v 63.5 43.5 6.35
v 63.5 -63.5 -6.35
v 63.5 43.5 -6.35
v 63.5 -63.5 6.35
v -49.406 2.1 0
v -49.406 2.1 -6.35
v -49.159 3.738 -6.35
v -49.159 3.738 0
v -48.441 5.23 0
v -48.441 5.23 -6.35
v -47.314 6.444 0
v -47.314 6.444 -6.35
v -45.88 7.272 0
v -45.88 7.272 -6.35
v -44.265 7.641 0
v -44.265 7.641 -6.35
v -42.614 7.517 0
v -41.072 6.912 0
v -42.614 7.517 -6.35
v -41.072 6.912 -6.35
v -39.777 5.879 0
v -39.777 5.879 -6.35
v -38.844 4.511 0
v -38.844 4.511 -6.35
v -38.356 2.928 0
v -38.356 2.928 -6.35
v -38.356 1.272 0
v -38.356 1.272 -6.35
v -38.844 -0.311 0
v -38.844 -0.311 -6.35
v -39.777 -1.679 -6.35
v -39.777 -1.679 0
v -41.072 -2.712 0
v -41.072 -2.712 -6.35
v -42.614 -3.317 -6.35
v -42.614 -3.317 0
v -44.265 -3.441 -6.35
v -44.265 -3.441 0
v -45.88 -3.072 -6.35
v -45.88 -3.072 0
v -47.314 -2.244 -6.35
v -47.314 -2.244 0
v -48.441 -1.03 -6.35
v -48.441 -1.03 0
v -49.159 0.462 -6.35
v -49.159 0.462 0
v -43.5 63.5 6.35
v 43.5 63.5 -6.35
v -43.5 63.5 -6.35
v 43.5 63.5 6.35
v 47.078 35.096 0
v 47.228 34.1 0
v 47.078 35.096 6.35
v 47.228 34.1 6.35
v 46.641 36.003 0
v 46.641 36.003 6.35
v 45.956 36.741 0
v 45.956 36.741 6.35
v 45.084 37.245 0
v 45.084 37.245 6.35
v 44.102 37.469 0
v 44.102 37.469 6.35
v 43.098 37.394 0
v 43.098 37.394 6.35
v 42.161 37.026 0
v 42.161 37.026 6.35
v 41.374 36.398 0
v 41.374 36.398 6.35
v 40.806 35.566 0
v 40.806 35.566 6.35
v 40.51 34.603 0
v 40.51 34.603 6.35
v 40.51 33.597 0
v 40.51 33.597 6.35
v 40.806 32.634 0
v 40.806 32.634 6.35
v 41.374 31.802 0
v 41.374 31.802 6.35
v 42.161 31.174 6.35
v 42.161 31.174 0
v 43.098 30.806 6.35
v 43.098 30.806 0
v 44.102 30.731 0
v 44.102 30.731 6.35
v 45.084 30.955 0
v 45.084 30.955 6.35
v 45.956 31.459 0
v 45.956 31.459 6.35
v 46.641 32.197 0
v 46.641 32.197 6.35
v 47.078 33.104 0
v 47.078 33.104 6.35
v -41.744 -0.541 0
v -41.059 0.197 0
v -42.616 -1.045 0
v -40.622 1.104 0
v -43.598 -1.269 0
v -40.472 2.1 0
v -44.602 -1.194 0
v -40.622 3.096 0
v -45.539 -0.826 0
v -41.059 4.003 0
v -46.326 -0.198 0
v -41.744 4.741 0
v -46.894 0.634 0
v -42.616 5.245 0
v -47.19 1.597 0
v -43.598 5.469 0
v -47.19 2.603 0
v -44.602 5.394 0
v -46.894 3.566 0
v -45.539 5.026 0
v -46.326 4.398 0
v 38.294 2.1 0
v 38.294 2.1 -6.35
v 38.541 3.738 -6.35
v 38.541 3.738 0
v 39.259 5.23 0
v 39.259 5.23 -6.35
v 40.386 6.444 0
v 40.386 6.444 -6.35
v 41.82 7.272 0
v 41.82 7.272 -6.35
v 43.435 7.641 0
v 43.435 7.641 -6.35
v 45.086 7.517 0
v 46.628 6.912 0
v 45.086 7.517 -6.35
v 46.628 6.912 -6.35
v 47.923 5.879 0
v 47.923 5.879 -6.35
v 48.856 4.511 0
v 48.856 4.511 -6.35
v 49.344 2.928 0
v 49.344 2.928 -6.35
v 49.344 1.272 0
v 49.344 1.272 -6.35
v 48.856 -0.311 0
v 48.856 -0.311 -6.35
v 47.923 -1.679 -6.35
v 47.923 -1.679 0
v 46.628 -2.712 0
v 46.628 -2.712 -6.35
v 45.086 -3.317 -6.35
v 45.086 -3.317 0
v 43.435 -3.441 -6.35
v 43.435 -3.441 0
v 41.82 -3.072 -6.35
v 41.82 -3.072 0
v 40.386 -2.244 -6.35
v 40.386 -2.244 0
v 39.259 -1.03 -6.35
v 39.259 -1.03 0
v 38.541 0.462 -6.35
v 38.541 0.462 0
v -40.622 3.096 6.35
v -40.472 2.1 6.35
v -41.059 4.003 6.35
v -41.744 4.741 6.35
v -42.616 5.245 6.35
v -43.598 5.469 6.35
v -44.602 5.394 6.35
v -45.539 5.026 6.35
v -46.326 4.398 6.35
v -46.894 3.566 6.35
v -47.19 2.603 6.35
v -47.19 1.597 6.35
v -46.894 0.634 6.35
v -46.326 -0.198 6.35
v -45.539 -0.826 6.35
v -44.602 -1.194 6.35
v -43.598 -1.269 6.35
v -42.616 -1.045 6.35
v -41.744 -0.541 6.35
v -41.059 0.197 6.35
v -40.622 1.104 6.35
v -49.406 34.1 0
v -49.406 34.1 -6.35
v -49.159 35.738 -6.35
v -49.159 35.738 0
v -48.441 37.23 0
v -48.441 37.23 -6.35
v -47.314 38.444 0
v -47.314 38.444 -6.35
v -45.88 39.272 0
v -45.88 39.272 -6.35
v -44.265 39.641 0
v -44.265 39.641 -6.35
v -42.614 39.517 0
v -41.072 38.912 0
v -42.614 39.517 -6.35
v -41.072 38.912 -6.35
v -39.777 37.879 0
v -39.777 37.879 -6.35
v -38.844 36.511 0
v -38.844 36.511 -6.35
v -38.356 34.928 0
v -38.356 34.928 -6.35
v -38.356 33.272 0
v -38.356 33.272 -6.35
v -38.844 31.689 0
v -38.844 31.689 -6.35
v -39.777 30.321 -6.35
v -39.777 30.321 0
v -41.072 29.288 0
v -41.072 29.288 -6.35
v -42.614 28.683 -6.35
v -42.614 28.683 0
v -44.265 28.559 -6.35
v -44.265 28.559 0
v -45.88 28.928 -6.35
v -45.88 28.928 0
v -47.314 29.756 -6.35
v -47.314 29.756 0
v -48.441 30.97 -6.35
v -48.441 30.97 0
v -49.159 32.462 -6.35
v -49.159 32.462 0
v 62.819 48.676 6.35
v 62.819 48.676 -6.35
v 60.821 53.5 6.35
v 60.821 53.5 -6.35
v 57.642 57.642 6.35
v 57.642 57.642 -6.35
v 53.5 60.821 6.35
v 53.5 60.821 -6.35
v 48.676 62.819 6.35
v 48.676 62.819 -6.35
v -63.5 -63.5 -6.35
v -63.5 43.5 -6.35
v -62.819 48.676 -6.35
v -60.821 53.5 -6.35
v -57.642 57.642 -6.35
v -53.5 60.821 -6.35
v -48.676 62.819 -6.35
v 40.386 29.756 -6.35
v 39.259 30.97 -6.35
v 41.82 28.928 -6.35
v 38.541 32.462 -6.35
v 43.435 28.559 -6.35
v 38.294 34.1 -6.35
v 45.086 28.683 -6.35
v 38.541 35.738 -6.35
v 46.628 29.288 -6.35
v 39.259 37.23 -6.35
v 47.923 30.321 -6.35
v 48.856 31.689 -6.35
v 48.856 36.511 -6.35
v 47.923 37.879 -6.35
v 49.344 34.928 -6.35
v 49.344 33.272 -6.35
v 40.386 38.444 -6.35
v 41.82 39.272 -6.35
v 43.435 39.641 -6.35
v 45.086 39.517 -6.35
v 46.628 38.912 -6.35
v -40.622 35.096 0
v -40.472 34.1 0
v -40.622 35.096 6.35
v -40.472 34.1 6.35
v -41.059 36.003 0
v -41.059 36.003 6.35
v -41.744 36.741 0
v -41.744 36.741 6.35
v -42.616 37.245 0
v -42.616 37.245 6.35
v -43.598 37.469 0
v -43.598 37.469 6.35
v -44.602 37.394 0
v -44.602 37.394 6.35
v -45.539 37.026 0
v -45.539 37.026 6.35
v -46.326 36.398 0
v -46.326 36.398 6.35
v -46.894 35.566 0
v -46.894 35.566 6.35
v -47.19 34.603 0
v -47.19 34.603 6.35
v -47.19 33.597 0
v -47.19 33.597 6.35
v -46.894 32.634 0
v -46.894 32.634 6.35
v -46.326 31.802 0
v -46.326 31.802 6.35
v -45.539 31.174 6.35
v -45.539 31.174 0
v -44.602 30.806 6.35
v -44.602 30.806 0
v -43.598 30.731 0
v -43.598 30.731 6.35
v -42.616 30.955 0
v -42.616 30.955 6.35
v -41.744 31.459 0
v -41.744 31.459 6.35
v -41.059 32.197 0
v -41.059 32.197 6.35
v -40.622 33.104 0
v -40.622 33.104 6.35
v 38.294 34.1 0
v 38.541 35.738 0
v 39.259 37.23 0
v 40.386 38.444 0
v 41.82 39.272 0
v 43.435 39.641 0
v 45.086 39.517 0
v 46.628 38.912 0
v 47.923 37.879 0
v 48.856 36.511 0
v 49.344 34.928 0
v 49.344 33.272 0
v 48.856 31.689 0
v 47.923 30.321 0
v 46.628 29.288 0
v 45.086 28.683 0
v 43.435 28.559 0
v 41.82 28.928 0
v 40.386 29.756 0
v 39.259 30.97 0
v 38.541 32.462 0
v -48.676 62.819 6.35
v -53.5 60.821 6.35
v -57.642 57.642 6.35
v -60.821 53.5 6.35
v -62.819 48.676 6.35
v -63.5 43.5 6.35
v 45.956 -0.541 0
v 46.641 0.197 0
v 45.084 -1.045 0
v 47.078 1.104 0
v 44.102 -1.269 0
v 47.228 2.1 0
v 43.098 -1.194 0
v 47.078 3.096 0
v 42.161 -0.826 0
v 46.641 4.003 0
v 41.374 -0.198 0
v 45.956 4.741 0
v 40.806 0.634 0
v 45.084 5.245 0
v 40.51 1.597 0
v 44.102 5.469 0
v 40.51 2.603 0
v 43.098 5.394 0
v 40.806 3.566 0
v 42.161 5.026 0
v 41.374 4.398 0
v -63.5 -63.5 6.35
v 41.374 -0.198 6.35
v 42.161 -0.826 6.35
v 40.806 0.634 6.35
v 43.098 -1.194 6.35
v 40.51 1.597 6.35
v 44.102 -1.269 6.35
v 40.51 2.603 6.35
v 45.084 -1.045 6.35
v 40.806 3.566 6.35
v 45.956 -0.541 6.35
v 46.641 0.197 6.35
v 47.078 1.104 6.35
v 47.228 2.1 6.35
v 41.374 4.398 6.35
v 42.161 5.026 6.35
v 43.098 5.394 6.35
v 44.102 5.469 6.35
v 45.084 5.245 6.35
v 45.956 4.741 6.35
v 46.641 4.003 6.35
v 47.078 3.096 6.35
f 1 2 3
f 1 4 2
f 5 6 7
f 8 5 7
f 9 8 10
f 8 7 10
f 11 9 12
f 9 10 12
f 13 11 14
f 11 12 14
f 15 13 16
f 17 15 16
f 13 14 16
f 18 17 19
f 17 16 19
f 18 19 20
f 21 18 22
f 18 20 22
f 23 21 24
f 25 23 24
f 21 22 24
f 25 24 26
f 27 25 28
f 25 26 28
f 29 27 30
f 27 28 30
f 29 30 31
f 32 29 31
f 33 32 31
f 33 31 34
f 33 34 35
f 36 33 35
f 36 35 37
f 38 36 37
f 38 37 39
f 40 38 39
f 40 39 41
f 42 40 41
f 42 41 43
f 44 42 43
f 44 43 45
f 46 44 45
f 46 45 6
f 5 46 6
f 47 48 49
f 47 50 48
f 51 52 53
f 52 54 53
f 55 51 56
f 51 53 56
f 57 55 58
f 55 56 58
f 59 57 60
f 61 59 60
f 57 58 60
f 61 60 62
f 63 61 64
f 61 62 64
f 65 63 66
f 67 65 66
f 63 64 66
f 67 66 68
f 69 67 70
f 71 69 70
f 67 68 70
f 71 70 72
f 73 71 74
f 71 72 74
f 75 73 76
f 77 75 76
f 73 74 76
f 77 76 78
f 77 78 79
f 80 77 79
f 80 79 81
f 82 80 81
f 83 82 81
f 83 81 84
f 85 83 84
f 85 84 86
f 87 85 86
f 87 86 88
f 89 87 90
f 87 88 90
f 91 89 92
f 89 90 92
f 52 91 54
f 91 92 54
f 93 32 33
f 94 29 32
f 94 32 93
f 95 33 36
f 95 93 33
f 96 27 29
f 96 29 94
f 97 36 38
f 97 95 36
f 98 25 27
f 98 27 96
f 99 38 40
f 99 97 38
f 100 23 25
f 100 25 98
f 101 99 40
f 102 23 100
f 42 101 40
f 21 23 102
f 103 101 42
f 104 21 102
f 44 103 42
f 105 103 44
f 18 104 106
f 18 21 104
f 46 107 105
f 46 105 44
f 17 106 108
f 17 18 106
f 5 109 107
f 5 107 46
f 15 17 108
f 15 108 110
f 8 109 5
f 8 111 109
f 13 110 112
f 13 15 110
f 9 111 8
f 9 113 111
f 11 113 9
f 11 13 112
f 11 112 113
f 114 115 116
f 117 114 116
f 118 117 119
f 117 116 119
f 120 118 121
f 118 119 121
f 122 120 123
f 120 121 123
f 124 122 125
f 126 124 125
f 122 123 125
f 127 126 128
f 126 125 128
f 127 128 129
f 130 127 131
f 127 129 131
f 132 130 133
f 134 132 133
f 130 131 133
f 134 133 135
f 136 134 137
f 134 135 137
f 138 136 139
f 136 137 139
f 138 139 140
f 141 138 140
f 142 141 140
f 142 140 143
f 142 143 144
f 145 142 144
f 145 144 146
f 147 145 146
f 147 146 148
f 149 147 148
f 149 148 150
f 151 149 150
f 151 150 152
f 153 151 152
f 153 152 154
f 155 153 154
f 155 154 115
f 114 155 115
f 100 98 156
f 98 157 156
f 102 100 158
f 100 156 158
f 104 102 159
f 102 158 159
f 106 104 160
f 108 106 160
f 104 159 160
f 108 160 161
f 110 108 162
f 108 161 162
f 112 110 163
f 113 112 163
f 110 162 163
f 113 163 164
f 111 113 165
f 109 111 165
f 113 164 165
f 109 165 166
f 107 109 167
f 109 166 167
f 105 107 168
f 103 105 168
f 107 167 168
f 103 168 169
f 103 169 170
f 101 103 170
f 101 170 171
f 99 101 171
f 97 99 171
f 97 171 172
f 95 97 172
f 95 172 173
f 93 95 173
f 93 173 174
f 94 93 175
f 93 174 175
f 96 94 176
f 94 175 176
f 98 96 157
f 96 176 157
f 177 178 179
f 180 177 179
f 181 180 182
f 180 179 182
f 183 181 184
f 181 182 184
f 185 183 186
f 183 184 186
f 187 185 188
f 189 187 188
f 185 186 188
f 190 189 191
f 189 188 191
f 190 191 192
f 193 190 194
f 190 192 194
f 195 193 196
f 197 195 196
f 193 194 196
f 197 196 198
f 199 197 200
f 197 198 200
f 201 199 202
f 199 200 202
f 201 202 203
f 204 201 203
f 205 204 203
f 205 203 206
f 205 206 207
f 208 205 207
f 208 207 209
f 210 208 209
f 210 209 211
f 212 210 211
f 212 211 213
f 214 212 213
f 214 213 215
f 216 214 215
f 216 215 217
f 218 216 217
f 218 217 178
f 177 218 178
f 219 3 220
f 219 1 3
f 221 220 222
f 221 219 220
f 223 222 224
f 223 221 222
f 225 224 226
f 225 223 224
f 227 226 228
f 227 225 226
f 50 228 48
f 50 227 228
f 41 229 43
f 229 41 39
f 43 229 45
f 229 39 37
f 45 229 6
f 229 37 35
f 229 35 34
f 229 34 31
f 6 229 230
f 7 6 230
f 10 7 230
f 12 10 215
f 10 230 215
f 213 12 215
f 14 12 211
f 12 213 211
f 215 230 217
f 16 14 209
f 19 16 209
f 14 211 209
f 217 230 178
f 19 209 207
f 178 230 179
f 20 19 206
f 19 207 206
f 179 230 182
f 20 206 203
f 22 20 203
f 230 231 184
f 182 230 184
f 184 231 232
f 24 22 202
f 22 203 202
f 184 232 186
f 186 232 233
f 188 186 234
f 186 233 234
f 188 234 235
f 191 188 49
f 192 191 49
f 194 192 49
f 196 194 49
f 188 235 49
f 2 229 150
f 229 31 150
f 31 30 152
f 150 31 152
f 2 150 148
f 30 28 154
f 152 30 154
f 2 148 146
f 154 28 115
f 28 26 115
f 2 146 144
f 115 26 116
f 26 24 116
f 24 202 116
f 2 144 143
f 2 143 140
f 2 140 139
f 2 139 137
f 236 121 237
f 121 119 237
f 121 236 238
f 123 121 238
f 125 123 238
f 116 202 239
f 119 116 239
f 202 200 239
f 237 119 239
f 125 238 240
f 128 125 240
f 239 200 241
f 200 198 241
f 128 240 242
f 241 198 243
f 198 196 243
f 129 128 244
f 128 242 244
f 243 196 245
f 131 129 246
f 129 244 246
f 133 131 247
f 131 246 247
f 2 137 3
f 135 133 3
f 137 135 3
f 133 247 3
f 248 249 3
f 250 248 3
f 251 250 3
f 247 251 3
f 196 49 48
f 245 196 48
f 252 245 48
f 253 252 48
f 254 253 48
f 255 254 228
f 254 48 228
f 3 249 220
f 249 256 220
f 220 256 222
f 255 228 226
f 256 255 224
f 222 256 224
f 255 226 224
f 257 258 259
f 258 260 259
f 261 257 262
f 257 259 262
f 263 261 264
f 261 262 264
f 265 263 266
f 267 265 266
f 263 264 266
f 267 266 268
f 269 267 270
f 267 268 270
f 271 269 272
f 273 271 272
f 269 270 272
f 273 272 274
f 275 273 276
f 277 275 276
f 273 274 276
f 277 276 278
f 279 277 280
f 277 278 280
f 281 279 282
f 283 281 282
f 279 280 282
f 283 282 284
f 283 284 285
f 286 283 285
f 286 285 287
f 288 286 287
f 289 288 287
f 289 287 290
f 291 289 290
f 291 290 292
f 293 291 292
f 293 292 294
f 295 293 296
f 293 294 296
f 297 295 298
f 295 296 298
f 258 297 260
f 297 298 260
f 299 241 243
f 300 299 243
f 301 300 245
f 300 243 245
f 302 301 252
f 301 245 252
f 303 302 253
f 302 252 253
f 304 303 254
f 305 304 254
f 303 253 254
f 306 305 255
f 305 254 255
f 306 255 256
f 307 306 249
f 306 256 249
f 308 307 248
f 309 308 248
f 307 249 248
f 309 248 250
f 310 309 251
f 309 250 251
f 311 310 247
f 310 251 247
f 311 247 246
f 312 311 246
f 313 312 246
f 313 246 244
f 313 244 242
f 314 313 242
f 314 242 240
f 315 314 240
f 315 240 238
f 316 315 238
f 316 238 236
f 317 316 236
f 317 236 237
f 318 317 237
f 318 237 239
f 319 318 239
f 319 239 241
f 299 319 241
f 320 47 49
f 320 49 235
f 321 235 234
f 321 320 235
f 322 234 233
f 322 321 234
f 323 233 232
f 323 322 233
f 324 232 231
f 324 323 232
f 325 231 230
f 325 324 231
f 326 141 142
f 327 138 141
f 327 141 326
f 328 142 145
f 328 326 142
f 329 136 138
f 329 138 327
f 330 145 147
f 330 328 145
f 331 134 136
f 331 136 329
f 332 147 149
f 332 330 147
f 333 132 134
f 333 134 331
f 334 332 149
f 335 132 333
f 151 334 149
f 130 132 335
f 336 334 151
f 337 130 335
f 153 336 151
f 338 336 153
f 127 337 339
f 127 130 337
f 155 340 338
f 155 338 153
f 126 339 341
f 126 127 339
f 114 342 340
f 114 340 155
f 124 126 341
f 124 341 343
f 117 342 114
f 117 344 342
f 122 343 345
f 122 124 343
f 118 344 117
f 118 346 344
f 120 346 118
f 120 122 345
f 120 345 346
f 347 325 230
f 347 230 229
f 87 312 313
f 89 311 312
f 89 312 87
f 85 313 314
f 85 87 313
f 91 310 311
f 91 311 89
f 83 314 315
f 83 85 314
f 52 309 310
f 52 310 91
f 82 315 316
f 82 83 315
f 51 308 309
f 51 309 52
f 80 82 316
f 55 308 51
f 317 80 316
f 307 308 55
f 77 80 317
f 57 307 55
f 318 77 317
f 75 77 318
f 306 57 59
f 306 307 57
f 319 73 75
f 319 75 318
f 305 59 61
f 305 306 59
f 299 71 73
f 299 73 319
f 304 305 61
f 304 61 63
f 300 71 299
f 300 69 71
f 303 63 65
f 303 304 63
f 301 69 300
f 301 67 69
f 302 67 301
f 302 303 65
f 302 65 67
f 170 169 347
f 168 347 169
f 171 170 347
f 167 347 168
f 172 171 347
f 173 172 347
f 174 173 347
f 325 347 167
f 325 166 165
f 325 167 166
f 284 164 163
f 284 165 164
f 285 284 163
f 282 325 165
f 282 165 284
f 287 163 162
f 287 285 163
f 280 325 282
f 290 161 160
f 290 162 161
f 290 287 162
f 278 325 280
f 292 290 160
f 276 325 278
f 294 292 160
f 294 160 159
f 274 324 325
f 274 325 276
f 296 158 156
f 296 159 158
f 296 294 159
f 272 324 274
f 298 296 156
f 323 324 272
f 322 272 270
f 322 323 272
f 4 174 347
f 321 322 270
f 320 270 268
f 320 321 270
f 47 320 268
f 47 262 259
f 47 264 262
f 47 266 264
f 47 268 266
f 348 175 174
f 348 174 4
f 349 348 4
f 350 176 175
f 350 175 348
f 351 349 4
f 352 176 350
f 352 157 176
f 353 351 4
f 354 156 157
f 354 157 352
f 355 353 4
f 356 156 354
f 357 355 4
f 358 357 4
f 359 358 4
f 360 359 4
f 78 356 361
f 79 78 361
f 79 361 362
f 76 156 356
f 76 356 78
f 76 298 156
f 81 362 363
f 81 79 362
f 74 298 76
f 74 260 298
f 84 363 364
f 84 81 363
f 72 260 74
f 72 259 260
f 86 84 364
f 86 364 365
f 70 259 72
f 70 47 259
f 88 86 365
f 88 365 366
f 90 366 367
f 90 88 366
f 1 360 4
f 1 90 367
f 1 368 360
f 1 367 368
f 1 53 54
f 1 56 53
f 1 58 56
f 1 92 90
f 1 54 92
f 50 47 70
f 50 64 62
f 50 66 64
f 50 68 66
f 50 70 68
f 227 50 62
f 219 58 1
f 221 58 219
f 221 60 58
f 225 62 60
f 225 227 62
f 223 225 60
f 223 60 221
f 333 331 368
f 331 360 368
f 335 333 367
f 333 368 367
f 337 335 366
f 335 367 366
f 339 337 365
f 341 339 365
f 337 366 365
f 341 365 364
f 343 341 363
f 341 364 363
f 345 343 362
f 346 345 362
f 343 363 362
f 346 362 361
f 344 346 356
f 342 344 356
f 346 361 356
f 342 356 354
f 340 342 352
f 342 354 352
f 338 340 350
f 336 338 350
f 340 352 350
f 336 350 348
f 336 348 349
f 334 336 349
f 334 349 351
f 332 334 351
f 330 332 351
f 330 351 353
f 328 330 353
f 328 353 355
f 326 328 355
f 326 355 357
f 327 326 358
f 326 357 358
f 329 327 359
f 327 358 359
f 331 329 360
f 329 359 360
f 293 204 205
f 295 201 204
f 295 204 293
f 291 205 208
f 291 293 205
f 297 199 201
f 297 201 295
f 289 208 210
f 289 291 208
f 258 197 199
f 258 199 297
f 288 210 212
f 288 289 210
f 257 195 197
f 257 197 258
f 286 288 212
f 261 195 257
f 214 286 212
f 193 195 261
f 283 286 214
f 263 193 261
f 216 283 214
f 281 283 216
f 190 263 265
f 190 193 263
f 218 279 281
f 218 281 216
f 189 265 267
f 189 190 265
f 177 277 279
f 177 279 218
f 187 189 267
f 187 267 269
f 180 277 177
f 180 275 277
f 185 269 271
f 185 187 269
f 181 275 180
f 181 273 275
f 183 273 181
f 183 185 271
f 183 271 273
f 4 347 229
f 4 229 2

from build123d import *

# Parameters (mm, degrees)
SALIENTE_EXTRUIR1_DEPTH                              = 6.35
REFRENTADO_PARA_TORNILLO_CON_CABEZA_HUEC_D           = 6.7564
REFRENTADO_PARA_TORNILLO_CON_CABEZA_HUEC_CBORE_D     = 11.1125
REFRENTADO_PARA_TORNILLO_CON_CABEZA_HUEC_CBORE_DEPTH = 6.35


with BuildPart() as part:
    # Croquis1 → Saliente-Extruir1 (new, symmetric)
    with BuildSketch(Plane.XY):
        with BuildLine():
            Line((43.5, 63.5), (-43.5, 63.5))
            ThreePointArc((-43.5, 63.5), (-57.642135624, 57.642135624), (-63.5, 43.5))
            Line((-63.5, 43.5), (-63.5, -63.5))
            Line((-63.5, -63.5), (63.5, -63.5))
            Line((63.5, -63.5), (63.5, 43.5))
            ThreePointArc((63.5, 43.5), (57.642135624, 57.642135624), (43.5, 63.5))
        make_face()
    extrude(amount=SALIENTE_EXTRUIR1_DEPTH, both=True)

    # Refrentado para tornillo con cabeza hueca de 1/41 (through all)
    with Locations(Plane(origin=(0, 0, -6.35), x_dir=(-1, 0, 0), z_dir=(0, 0, -1))):
        with Locations((43.85, 34.1), (43.85, 2.1), (-43.85, 2.1), (-43.85, 34.1)):
            CounterBoreHole(REFRENTADO_PARA_TORNILLO_CON_CABEZA_HUEC_D / 2, REFRENTADO_PARA_TORNILLO_CON_CABEZA_HUEC_CBORE_D / 2, REFRENTADO_PARA_TORNILLO_CON_CABEZA_HUEC_CBORE_DEPTH)


solid = part.part
